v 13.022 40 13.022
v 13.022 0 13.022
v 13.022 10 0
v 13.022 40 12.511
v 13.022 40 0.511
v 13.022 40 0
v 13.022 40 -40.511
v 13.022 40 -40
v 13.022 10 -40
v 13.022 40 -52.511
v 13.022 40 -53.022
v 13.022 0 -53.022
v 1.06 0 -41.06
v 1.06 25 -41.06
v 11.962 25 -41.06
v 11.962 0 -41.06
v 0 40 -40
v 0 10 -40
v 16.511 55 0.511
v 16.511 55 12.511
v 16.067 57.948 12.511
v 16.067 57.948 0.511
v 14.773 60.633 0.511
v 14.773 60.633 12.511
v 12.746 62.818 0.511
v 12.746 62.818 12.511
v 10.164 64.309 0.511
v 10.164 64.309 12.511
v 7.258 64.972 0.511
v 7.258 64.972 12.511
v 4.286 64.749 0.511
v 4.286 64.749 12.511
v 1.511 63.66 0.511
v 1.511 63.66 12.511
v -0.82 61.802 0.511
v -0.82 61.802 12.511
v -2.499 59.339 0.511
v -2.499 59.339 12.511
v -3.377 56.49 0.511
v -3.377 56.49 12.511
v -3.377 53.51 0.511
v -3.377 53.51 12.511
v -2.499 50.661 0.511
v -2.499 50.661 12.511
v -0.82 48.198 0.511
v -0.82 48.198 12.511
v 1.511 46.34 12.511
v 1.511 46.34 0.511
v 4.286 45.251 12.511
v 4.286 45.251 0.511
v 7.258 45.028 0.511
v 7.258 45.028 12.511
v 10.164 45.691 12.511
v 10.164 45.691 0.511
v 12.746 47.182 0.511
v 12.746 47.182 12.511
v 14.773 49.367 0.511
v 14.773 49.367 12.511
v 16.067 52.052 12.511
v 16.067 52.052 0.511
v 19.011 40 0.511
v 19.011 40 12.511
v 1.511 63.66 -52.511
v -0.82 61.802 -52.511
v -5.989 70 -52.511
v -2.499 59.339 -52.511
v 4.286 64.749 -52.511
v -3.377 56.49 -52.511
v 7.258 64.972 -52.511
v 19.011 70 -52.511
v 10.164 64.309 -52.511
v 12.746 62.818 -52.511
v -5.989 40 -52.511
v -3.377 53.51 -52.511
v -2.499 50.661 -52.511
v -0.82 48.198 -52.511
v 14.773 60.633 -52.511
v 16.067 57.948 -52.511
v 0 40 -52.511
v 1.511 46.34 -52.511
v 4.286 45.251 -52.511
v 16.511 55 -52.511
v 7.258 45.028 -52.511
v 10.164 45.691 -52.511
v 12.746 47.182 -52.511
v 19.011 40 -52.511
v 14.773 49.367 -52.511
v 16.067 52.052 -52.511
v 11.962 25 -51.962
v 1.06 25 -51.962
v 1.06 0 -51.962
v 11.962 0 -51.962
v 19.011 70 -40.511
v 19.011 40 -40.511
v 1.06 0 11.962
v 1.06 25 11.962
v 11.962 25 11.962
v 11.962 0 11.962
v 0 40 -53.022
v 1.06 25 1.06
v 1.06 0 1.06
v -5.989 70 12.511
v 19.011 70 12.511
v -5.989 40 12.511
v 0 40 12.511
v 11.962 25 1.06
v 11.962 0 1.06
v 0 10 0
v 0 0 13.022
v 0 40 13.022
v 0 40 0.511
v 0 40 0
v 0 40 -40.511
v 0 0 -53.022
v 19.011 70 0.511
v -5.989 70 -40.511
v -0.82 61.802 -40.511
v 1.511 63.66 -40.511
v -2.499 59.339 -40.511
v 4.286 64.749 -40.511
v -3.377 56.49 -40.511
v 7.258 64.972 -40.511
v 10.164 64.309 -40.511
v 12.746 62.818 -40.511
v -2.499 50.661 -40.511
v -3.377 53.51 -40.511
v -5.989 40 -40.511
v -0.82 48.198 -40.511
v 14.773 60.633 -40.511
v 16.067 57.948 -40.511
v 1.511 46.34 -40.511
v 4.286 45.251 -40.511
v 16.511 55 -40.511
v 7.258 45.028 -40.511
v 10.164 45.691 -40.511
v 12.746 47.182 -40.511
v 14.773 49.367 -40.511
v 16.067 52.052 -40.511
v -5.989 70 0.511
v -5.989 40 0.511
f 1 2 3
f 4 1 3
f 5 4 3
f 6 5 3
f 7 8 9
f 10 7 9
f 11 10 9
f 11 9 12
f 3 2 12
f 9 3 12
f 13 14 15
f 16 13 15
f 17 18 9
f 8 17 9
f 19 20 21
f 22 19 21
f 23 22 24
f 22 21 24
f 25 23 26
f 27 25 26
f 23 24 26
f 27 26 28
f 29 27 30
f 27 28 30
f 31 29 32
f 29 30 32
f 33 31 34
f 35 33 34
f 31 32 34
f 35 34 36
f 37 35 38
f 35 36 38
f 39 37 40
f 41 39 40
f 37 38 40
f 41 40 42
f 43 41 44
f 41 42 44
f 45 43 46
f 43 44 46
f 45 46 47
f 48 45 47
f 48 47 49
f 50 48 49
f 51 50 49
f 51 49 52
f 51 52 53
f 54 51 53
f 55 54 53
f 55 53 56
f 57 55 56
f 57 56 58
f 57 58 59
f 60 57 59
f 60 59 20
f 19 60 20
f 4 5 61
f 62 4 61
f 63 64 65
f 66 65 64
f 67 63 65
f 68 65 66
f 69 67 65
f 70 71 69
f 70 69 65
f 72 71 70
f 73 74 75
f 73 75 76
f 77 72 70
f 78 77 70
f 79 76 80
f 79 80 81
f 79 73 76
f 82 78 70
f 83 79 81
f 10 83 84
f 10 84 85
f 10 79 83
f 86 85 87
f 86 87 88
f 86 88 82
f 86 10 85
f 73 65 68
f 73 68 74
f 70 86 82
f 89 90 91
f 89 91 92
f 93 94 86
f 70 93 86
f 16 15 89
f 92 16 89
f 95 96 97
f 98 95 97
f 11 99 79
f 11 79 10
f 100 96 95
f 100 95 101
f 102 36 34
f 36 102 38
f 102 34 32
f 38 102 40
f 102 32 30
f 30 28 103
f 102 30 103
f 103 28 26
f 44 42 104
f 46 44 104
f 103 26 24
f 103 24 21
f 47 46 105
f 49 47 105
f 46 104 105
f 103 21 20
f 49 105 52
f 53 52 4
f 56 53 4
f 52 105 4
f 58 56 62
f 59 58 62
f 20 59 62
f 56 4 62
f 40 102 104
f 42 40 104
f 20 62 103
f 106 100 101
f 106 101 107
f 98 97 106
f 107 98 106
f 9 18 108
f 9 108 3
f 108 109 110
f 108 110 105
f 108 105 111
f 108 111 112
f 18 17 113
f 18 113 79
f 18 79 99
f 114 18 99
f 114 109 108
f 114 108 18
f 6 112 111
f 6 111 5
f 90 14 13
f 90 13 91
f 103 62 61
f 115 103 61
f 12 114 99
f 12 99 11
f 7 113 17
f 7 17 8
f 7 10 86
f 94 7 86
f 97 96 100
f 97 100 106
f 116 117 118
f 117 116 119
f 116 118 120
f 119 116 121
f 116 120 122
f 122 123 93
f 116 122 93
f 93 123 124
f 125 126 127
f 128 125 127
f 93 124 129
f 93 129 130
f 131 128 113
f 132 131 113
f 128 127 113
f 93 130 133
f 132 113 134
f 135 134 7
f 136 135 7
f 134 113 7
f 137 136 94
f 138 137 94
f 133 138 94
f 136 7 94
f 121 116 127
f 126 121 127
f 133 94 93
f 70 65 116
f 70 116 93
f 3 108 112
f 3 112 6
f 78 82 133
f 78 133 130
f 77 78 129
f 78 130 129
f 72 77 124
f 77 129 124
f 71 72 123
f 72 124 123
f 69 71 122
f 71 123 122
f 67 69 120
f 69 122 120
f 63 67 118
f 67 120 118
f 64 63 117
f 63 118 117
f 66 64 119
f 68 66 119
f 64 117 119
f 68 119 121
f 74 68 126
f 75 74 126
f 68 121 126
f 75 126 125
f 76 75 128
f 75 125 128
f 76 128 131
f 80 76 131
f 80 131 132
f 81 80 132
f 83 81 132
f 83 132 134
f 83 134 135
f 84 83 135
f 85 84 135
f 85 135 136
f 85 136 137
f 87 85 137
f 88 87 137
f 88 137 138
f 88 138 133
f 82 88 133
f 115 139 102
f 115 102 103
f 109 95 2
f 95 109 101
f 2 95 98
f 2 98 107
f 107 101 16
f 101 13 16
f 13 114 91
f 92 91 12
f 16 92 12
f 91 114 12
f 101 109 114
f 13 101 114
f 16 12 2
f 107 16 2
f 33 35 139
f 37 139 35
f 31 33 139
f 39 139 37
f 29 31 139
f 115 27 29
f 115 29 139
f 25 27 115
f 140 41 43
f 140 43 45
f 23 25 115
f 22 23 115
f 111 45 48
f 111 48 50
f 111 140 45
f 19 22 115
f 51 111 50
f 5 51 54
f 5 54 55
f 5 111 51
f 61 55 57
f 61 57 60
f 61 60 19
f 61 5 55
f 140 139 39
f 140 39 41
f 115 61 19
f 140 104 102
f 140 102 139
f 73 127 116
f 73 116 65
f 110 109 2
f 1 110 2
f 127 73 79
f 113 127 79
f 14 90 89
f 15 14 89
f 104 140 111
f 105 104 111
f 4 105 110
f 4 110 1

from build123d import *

# Parameters (mm, degrees)
SKETCH1_W                = 13.022
SKETCH1_H                = 40
BOSS_EXTRUDE1_DEPTH      = 10
BOSS_EXTRUDE2_DEPTH      = 30
BOSS_EXTRUDE2_DEPTH_BACK = 10
SKETCH2_W                = 13.022
SKETCH2_H                = 13.022
SKETCH3_W                = 10.902
SKETCH3_H                = 10.902
CUT_EXTRUDE1_DEPTH       = 50
BOSS_EXTRUDE3_START      = 15
SKETCH4_W                = 10.902
SKETCH4_H                = 10.902
BOSS_EXTRUDE3_DEPTH      = 15
SKETCH5_W                = 25
SKETCH5_H                = 12
BOSS_EXTRUDE4_DEPTH      = 30
SKETCH6_R                = 10
CUT_EXTRUDE2_DEPTH       = 100


with BuildPart() as part:
    # Sketch1 → Boss-Extrude1 (new body)
    with BuildSketch(Plane(origin=(0, 0, 0), x_dir=(1, 0, 0), z_dir=(0, 1, 0))):
        with Locations((6.511, 20)):
            Rectangle(SKETCH1_W, SKETCH1_H)
    extrude(amount=BOSS_EXTRUDE1_DEPTH)

    # Sketch2 → Boss-Extrude2 (add, two sides: drawn at the far end of the back side and taken through both)
    with BuildSketch(Plane(origin=(0, 10, 0), x_dir=(1, 0, 0), z_dir=(0, 1, 0)).offset(-BOSS_EXTRUDE2_DEPTH_BACK)):
        with Locations((6.511, 46.511)):
            Rectangle(SKETCH2_W, SKETCH2_H)
        with Locations((6.511, -6.511)):
            Rectangle(SKETCH2_W, SKETCH2_H)
    extrude(amount=BOSS_EXTRUDE2_DEPTH + BOSS_EXTRUDE2_DEPTH_BACK)

    # Sketch3 → Cut-Extrude1 (cut)
    with BuildSketch(Plane(origin=(0, 40, 0), x_dir=(1, 0, 0), z_dir=(0, 1, 0))):
        with Locations((6.511, 46.511)):
            Rectangle(SKETCH3_W, SKETCH3_H)
        with Locations((6.511, -6.511)):
            Rectangle(SKETCH3_W, SKETCH3_H)
    extrude(amount=-CUT_EXTRUDE1_DEPTH, mode=Mode.SUBTRACT)

    # Sketch4 → Boss-Extrude3 (add)
    with BuildSketch(Plane(origin=(0, 10, 0), x_dir=(1, 0, 0), z_dir=(0, 1, 0)).offset(BOSS_EXTRUDE3_START)):
        with Locations((6.511, 46.511)):
            Rectangle(SKETCH4_W, SKETCH4_H)
        with Locations((6.511, -6.511)):
            Rectangle(SKETCH4_W, SKETCH4_H)
    extrude(amount=BOSS_EXTRUDE3_DEPTH)

    # Sketch5 → Boss-Extrude4 (add)
    with BuildSketch(Plane(origin=(0, 40, 0), x_dir=(1, 0, 0), z_dir=(0, 1, 0))):
        with Locations((6.511, 46.511)):
            Rectangle(SKETCH5_W, SKETCH5_H)
        with Locations((6.511, -6.511)):
            Rectangle(SKETCH5_W, SKETCH5_H)
    extrude(amount=BOSS_EXTRUDE4_DEPTH)

    # Sketch6 → Cut-Extrude2 (cut)
    with BuildSketch(Plane.XY.offset(12.511)):
        with Locations((6.511, 55)):
            Circle(SKETCH6_R)
    extrude(amount=-CUT_EXTRUDE2_DEPTH, mode=Mode.SUBTRACT)


solid = part.part
